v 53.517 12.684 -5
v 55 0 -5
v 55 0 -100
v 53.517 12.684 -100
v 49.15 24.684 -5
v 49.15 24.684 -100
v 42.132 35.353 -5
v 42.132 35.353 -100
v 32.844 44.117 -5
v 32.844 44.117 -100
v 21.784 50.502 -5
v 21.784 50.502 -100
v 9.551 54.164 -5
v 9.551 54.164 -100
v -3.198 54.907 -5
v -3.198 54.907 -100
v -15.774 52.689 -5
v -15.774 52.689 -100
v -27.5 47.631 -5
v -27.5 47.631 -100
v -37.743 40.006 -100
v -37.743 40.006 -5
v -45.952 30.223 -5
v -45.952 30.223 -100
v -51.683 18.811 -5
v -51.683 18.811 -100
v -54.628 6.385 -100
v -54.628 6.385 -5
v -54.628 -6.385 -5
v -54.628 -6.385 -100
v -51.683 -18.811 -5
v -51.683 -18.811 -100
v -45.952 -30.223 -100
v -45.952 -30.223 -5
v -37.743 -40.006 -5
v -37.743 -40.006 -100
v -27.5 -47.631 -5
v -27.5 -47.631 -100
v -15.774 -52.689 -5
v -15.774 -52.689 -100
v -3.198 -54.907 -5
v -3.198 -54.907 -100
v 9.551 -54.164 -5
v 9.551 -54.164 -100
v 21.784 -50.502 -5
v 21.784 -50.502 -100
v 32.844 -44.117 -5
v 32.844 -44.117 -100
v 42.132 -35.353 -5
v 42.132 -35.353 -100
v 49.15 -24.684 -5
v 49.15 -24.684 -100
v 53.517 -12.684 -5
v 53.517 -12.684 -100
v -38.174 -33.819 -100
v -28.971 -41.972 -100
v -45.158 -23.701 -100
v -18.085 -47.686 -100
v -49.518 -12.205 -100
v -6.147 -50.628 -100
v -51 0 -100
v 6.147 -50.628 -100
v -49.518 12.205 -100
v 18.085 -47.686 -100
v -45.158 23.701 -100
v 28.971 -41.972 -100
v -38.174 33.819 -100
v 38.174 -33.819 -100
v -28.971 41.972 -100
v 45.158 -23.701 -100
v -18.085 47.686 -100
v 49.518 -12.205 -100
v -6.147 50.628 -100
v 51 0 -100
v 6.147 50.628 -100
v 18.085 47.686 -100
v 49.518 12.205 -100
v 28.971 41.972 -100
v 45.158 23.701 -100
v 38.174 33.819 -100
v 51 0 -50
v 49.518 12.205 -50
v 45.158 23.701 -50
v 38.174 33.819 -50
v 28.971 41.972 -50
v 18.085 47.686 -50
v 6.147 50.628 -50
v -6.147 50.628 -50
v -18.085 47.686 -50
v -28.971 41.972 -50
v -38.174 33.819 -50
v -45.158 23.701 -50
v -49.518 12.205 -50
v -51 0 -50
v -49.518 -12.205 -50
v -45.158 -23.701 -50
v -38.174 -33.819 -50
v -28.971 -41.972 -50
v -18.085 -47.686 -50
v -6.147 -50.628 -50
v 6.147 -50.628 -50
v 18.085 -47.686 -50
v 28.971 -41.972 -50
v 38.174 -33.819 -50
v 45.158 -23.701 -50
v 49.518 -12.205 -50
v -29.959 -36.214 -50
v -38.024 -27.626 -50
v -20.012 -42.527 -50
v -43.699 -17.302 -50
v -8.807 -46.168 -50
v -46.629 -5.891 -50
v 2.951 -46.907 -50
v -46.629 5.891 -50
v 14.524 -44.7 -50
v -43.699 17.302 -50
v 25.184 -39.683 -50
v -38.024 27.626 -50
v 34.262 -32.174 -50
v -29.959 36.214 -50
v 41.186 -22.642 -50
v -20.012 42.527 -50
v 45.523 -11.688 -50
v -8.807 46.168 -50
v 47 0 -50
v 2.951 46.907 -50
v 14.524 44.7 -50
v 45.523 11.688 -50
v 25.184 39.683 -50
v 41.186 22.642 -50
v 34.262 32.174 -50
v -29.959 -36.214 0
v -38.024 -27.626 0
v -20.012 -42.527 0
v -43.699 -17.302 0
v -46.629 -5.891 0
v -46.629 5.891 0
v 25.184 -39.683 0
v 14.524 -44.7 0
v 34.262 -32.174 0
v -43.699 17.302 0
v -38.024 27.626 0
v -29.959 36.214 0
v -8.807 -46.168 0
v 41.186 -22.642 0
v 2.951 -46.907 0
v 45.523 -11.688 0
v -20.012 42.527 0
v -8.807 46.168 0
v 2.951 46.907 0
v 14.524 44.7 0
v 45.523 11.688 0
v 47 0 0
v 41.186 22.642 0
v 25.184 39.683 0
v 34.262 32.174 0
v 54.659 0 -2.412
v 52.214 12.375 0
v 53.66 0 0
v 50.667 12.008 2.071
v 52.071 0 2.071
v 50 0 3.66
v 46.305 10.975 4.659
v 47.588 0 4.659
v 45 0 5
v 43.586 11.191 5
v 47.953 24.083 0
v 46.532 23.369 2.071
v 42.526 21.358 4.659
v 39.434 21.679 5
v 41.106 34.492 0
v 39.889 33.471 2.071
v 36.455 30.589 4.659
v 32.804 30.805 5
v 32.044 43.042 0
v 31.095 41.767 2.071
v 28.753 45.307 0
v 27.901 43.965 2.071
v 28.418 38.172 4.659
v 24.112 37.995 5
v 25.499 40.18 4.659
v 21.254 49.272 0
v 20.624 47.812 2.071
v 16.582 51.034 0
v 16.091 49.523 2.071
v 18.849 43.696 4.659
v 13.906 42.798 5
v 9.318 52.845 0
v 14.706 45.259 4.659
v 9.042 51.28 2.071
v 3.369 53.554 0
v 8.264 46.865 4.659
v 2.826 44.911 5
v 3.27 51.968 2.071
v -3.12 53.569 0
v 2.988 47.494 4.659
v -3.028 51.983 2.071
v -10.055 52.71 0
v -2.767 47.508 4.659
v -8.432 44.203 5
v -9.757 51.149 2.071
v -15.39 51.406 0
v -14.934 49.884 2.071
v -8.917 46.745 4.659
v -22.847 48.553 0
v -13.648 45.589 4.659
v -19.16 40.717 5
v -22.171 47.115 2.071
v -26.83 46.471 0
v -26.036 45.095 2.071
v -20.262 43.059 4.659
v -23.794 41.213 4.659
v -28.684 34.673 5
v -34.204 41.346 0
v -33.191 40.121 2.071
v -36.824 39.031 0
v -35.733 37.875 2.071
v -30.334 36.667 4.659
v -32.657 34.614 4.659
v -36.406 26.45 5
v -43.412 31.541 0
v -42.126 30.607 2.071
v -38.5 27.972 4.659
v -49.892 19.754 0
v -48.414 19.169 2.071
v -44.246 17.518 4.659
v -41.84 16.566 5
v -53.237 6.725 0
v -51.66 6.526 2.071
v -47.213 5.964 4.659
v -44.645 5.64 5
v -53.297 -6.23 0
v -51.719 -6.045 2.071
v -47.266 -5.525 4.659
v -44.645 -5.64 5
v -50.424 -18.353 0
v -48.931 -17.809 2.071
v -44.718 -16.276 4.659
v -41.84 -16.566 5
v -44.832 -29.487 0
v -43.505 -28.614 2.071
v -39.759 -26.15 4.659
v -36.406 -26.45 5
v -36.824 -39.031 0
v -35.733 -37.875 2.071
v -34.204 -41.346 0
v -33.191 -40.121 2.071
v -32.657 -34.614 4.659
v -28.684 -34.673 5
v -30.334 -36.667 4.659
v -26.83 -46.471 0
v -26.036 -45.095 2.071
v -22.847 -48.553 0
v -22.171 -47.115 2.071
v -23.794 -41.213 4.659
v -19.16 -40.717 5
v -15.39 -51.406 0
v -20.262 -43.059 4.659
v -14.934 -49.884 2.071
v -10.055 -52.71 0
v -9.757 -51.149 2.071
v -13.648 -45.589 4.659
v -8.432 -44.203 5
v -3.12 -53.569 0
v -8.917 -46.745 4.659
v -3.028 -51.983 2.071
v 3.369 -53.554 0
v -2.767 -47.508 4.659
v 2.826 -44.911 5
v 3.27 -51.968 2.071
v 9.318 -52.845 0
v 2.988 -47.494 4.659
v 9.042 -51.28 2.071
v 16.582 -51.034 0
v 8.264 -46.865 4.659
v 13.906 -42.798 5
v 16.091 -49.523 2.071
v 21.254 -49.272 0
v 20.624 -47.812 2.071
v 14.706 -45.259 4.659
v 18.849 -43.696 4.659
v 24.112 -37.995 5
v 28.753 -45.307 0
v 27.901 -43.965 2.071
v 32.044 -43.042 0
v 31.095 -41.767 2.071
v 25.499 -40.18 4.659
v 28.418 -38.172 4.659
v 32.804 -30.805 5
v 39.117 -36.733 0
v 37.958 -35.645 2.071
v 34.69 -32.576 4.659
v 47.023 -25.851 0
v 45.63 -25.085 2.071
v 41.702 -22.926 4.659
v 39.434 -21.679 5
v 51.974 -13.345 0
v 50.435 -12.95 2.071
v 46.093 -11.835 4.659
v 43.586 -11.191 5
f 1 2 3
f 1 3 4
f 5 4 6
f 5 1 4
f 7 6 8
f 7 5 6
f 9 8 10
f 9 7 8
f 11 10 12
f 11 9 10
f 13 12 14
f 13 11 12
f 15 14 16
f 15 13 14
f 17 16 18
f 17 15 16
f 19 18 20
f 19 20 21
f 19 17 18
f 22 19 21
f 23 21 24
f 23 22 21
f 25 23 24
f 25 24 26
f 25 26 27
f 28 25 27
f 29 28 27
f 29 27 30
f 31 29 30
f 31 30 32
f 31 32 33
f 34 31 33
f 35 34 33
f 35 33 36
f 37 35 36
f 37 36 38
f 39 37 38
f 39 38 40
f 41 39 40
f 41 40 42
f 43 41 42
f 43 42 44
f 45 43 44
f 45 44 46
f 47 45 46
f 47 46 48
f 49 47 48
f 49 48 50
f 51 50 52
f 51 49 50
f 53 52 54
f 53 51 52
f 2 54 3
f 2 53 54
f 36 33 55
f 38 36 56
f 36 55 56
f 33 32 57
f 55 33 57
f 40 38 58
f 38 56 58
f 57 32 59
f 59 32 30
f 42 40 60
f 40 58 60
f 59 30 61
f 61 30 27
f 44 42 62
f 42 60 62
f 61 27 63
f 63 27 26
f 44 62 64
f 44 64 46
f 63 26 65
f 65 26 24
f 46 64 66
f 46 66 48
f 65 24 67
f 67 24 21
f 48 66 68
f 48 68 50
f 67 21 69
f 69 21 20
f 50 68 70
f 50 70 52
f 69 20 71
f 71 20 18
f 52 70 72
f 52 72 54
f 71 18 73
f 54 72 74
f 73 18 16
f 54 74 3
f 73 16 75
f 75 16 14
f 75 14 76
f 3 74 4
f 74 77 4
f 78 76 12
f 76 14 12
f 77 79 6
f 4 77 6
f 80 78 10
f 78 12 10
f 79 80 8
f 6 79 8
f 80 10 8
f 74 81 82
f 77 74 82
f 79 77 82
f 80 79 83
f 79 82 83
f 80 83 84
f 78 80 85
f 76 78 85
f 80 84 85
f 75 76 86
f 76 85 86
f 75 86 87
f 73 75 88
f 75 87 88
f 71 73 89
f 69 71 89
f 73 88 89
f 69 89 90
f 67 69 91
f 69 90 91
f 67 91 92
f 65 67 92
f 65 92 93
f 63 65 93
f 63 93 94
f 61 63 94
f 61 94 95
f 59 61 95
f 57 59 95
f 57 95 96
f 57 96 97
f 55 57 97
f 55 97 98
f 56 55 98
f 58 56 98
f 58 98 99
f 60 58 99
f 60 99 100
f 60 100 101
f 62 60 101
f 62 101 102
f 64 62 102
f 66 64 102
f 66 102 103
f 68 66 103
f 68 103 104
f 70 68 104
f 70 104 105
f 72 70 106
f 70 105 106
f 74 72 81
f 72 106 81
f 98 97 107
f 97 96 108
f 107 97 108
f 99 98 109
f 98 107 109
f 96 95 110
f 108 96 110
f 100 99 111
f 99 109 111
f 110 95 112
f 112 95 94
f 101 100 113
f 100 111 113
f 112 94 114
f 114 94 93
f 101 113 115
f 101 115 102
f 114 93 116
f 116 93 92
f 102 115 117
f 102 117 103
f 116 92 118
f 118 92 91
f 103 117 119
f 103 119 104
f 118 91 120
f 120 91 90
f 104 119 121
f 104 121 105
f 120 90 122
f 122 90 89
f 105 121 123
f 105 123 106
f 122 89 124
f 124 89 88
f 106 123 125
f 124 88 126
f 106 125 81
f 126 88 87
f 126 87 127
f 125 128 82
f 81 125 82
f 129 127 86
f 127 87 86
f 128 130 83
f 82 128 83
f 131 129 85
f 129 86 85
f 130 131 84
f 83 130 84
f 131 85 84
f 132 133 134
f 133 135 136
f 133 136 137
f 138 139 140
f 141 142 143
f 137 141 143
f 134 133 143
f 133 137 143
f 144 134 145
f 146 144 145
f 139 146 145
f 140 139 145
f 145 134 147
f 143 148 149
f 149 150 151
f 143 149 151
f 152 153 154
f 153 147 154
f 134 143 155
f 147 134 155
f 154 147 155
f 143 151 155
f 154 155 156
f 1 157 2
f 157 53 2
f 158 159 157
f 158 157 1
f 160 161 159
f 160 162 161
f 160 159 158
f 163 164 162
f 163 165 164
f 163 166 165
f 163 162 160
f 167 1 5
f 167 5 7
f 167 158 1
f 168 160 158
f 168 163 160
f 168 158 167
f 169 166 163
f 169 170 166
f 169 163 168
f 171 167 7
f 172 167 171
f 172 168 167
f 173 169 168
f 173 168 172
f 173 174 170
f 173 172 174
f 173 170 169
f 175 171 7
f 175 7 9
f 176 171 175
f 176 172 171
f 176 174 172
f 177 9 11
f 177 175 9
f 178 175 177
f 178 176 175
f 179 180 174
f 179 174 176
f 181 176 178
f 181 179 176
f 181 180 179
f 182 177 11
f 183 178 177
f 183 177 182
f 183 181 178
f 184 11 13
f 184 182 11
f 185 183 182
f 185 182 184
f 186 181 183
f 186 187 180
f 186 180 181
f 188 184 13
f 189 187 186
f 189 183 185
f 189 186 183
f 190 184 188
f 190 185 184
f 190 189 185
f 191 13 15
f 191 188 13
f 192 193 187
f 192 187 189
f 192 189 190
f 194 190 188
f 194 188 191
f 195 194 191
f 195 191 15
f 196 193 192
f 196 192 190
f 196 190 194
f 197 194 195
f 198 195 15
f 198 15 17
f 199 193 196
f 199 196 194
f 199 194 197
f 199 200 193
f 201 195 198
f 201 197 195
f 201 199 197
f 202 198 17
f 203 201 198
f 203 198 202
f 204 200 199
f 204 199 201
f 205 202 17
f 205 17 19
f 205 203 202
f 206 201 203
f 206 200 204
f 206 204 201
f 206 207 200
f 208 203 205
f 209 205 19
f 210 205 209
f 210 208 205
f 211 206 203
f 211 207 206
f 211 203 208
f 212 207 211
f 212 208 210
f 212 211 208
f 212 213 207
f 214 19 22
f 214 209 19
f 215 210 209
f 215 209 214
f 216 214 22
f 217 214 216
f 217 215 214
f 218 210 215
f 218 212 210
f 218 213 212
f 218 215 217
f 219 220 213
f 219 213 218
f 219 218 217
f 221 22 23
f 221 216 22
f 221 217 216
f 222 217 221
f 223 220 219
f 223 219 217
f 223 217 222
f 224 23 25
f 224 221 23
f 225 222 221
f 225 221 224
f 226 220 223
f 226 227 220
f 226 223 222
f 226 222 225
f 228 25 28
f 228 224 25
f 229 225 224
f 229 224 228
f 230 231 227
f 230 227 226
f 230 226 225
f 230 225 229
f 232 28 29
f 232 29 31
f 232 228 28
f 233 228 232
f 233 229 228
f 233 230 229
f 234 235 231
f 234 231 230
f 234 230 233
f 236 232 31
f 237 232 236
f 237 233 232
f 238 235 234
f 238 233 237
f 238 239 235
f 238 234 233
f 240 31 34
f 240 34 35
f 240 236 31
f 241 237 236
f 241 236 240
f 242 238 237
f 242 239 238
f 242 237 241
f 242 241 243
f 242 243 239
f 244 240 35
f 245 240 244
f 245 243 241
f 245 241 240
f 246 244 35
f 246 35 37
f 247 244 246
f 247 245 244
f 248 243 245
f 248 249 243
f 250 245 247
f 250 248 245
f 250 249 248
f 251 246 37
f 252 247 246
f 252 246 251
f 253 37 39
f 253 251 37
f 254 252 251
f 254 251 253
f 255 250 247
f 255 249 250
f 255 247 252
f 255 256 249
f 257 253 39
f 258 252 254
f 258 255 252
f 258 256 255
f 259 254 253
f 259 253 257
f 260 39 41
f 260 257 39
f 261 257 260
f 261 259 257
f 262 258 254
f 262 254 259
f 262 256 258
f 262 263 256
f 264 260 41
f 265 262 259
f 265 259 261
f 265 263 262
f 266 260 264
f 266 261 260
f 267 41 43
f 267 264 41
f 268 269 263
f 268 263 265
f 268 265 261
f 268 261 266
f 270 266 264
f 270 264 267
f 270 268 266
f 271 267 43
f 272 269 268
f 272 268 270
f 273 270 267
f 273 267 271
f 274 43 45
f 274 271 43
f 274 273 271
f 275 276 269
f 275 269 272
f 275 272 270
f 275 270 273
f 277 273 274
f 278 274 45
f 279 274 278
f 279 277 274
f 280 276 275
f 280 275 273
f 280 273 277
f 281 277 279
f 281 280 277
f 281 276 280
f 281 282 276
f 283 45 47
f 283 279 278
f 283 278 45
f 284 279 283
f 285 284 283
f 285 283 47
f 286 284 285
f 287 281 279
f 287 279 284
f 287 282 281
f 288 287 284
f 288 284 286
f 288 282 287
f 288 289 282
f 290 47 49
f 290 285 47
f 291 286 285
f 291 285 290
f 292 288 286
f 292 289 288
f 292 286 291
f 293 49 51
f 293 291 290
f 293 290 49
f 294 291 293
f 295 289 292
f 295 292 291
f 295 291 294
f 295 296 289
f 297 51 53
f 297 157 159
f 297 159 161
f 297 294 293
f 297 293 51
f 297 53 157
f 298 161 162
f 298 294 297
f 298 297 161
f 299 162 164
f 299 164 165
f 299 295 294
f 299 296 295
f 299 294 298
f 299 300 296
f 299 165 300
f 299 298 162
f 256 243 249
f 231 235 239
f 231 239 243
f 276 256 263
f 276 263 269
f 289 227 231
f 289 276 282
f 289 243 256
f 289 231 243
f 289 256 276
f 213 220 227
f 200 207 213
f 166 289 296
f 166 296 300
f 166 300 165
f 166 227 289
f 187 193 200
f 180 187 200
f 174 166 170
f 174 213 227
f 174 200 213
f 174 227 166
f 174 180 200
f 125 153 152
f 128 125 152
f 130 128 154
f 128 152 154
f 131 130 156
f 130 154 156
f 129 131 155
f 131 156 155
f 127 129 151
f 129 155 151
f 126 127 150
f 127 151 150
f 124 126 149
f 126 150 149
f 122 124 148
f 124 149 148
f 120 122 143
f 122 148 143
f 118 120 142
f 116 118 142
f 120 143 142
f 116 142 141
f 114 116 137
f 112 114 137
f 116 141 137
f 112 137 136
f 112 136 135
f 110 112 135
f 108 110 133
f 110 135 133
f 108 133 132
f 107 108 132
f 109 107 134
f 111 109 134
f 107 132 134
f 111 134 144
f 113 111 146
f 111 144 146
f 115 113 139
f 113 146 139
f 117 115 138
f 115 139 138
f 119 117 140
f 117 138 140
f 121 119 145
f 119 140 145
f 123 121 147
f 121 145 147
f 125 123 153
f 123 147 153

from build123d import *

# Parameters (mm, degrees)
F0_R     = 55
F0_R_2   = 51
F0_R_3   = 47
F1_DEPTH = 5
F2_DEPTH = 50
F3_DEPTH = 100
F4_R     = 10


with BuildPart() as f1:
    # F0 (on Top) → F1 (new body)
    with BuildSketch(Plane.XY):
        Circle(F0_R)
        Circle(F0_R_2, mode=Mode.SUBTRACT)
        Circle(F0_R_2)
        Circle(F0_R_3, mode=Mode.SUBTRACT)
        Circle(F0_R_3)
    extrude(amount=F1_DEPTH)

    # F0 (on Top) → F2 (join)
    with BuildSketch(Plane.XY):
        Circle(F0_R_2)
        Circle(F0_R_3, mode=Mode.SUBTRACT)
    extrude(amount=-F2_DEPTH)

    # F0 (on Top) → F3 (join)
    with BuildSketch(Plane.XY):
        Circle(F0_R)
        Circle(F0_R_2, mode=Mode.SUBTRACT)
    extrude(amount=-F3_DEPTH)

    # F4
    f4_edges = [f1.edges().sort_by_distance(p)[0] for p in [
        (-55, 0, 5),
    ]]
    fillet(f4_edges, radius=F4_R)


solid = f1.part
